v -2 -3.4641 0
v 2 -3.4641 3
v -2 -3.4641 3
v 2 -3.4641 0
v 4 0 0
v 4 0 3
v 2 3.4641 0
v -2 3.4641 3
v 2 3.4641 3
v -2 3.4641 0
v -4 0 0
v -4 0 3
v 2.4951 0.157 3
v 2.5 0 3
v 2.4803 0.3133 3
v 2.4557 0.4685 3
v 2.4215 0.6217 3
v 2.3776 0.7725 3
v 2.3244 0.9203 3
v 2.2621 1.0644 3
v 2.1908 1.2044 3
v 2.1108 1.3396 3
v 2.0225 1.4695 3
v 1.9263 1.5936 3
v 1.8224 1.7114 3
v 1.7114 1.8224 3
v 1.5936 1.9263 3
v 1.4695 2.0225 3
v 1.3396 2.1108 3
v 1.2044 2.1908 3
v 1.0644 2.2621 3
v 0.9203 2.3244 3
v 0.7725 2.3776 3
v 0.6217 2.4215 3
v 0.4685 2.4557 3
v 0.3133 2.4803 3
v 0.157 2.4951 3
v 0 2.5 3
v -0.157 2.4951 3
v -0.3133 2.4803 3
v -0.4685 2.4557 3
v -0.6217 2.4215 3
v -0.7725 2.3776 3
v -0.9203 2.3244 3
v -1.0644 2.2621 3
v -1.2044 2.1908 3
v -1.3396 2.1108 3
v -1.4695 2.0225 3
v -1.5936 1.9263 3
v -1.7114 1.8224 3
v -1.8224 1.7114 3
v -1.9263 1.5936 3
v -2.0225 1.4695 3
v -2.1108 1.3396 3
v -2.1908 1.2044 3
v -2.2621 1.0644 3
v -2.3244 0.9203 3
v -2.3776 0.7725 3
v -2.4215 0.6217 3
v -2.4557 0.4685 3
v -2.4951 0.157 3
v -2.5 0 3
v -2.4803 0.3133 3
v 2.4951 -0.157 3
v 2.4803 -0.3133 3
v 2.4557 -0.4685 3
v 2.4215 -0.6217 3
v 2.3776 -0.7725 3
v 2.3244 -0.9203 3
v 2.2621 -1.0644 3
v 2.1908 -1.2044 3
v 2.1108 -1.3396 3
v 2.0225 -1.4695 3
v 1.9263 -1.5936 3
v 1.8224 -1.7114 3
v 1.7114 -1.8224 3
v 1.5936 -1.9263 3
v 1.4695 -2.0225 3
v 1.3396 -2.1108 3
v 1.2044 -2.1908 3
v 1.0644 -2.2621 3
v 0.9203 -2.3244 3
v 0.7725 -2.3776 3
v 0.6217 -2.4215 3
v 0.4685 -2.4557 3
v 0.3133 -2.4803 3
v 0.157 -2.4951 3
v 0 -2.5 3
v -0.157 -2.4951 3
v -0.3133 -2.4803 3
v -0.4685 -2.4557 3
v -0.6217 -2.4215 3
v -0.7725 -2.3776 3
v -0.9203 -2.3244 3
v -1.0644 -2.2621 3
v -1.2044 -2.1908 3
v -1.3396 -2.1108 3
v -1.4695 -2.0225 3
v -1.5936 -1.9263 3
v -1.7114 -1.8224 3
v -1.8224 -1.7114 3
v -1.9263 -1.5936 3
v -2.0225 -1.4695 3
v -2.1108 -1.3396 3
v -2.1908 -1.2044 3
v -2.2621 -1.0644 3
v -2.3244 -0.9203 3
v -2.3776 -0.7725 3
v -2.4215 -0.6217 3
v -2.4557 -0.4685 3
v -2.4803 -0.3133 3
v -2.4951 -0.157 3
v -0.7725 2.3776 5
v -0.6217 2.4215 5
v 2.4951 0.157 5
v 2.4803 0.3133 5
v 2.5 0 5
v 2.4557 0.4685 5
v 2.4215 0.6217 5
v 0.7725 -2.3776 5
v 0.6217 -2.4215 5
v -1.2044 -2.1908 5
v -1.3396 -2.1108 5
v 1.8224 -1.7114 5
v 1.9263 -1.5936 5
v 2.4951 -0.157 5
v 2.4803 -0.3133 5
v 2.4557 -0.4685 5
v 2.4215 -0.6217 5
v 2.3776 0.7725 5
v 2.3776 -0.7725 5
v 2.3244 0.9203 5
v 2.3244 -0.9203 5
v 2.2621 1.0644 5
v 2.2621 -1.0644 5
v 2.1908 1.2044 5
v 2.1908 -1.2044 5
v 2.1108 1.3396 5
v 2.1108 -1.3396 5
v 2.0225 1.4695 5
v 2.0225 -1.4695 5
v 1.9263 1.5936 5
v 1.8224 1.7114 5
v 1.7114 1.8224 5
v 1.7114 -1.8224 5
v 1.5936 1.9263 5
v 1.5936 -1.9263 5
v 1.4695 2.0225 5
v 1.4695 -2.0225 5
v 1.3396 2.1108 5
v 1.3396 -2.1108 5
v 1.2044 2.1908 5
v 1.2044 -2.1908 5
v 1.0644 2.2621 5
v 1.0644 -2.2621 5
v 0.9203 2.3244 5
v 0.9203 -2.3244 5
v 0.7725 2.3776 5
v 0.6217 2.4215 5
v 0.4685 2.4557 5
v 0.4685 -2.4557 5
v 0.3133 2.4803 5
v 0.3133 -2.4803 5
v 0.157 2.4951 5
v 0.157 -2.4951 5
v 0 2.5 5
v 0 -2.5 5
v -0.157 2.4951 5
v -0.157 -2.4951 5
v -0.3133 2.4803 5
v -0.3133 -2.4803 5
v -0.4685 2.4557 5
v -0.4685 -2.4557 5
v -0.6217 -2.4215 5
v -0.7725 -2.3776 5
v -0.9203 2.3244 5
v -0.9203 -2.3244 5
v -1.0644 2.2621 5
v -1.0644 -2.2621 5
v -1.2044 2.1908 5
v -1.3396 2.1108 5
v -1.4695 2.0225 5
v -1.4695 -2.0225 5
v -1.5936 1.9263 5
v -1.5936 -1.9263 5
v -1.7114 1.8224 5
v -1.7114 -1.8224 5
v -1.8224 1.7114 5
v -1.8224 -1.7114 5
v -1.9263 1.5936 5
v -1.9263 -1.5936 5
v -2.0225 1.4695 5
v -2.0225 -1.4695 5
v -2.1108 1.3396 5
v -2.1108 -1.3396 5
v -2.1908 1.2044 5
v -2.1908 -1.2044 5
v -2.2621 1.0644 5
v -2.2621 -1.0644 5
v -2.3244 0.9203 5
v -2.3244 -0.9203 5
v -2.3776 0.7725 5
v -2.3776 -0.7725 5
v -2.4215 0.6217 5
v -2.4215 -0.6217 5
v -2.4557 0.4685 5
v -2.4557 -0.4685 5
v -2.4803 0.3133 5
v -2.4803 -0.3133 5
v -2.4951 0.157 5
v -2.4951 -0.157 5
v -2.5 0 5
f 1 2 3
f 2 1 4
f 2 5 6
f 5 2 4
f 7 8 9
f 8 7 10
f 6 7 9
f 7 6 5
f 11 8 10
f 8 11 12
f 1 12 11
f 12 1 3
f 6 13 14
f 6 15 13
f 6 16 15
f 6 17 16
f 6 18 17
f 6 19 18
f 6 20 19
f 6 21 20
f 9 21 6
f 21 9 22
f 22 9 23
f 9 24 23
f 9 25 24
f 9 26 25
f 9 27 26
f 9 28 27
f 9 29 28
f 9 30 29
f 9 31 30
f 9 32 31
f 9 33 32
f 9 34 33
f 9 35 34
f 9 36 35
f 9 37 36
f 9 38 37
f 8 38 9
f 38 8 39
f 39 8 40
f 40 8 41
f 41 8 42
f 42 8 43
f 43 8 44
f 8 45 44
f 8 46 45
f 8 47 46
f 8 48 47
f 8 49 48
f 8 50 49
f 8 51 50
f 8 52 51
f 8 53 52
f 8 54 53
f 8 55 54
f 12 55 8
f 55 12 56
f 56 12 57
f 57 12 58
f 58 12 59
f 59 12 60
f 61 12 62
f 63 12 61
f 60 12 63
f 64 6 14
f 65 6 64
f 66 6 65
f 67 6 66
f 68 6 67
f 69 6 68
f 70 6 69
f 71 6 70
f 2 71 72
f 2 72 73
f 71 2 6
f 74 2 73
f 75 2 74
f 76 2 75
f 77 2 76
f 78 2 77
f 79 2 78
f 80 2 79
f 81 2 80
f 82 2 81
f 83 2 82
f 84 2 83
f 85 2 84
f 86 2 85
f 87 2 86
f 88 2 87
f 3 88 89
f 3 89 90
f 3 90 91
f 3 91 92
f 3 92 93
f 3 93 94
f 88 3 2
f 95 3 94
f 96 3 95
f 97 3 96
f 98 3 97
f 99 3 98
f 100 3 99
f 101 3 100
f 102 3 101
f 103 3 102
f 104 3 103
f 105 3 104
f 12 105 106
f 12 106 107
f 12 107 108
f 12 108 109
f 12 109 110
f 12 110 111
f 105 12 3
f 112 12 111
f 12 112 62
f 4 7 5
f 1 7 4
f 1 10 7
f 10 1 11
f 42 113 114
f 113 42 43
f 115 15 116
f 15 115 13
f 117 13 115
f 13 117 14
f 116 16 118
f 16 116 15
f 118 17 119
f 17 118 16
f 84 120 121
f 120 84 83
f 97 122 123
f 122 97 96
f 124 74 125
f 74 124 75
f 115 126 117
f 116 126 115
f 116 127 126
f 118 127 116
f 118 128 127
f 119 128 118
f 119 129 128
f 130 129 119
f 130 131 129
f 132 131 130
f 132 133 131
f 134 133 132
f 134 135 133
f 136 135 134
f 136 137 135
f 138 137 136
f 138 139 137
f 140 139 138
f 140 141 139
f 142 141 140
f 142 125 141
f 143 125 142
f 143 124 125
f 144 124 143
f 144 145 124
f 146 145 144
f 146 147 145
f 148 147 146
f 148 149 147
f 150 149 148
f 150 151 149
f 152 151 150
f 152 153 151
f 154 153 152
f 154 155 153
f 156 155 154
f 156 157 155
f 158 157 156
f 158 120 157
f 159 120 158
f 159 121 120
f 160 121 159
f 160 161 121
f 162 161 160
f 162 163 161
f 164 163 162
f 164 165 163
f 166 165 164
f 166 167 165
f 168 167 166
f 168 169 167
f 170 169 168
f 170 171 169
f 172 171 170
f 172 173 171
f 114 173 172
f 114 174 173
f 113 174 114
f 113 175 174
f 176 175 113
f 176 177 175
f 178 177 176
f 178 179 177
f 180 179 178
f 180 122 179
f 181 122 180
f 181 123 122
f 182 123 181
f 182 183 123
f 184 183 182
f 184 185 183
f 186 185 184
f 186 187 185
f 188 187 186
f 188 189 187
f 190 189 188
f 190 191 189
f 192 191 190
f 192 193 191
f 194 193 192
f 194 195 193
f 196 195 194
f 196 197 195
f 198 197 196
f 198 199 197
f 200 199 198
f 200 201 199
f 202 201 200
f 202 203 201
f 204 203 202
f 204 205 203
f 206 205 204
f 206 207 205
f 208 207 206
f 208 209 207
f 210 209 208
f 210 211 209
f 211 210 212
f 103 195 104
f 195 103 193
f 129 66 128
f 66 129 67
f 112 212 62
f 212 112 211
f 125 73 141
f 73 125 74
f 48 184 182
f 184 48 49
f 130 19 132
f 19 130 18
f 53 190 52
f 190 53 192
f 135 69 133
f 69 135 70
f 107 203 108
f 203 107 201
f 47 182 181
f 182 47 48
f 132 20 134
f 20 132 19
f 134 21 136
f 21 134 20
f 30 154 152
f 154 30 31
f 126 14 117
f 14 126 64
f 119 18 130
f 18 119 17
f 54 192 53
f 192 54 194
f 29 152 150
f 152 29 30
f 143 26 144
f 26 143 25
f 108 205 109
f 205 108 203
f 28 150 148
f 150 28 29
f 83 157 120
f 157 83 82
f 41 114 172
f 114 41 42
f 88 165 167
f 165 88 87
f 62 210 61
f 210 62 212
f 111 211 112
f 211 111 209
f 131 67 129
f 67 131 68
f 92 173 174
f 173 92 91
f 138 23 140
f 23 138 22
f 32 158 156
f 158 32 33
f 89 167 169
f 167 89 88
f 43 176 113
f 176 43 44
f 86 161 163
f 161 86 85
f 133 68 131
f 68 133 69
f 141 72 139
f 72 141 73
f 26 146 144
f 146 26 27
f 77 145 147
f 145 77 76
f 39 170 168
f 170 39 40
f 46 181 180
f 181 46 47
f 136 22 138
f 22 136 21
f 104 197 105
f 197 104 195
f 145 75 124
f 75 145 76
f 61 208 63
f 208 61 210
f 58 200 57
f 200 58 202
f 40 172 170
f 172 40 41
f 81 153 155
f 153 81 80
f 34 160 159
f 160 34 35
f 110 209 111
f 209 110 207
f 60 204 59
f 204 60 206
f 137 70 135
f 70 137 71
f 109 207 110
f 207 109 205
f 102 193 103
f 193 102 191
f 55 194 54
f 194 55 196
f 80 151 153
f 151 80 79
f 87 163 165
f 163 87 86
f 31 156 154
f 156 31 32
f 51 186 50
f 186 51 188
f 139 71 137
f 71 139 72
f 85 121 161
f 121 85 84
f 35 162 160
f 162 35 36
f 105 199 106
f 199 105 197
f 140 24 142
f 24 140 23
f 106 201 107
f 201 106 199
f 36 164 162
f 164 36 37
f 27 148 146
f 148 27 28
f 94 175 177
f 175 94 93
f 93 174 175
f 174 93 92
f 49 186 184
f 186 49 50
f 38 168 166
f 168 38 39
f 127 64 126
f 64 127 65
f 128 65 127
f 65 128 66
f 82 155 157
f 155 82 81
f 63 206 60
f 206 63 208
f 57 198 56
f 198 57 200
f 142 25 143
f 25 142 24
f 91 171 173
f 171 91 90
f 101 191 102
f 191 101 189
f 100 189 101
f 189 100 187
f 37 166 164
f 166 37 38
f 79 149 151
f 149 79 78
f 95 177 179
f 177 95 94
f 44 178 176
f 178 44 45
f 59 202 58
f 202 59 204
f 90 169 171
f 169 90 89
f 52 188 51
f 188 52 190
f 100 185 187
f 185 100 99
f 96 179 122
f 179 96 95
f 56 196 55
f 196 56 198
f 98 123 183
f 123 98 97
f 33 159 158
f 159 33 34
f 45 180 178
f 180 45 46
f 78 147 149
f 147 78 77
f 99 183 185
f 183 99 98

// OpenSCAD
//resoluciOn
$fn=100;

//ancho del perfil 20 [mm]

module perfil1 (){
    //control del espesor del alumnio en las orillas
    medida=2;
difference(){
  square([20,20],center=true);
  circle(r=2);
  for(i=[1:4]){
  rotate(i*90)
  translate([0,-20/2])
  polygon(points=[[0,-medida],[3,-medida],[3,medida],[5,medida],[5,3],[3,5],[-3,5],[-5,3],[-5,medida],[-3,medida],[-3,-medida]]);
   
   //cuadrado detalle para rodamiento balero*
    rotate(i*90)
   translate([0,-20/2])
   square([7,0.7*2],center=true);   
   }
   
   //square([7,0.7*2],center=true)
   
}

}//fin module


module perfil2(){
translate([-10,0,0])
union(){
translate([20,0,0])
perfil1();
perfil1();
}
}

module esquinero(){
difference(){
cube([22.5,22.5,20],center=true);    

translate([6,6,0])
cube([22.5,22.5,10],center=true); 

translate([11,11,0])
cylinder(r=(22.5/2)+5,h=60,$fn=100,center=true);

!tornilloMaquina();
}
    
}

module baleroPatineta(){
difference(){
cylinder(r=22/2,h=7,center=true);
cylinder(r=8/2,h=7+2,center=true);
}    
}


module tornillo(altura=40){
    union(){
    cylinder($fn=6,h=6,r=15/2);
    cylinder($fn=100,h=altura,r=8/2);
    }
}


module tornilloMaquina(altura=5){
    union(){
    cylinder($fn=6,h=3,r=8/2);
    cylinder($fn=100,h=altura,r=5/2);
    }
}

module NEMA(){
union(){
  translate([0,0,20])
  cube([42,42,40],center=true);
  cylinder(r=16/2,h=62);
}

}


//####RENDERIZADOS####

esquinero();

/*
linear_extrude(height=400)
perfil1();
*/

/*
linear_extrude(height=300)
perfil2();
*/

//baleroPatineta();

//tornillo();

//NEMA();
